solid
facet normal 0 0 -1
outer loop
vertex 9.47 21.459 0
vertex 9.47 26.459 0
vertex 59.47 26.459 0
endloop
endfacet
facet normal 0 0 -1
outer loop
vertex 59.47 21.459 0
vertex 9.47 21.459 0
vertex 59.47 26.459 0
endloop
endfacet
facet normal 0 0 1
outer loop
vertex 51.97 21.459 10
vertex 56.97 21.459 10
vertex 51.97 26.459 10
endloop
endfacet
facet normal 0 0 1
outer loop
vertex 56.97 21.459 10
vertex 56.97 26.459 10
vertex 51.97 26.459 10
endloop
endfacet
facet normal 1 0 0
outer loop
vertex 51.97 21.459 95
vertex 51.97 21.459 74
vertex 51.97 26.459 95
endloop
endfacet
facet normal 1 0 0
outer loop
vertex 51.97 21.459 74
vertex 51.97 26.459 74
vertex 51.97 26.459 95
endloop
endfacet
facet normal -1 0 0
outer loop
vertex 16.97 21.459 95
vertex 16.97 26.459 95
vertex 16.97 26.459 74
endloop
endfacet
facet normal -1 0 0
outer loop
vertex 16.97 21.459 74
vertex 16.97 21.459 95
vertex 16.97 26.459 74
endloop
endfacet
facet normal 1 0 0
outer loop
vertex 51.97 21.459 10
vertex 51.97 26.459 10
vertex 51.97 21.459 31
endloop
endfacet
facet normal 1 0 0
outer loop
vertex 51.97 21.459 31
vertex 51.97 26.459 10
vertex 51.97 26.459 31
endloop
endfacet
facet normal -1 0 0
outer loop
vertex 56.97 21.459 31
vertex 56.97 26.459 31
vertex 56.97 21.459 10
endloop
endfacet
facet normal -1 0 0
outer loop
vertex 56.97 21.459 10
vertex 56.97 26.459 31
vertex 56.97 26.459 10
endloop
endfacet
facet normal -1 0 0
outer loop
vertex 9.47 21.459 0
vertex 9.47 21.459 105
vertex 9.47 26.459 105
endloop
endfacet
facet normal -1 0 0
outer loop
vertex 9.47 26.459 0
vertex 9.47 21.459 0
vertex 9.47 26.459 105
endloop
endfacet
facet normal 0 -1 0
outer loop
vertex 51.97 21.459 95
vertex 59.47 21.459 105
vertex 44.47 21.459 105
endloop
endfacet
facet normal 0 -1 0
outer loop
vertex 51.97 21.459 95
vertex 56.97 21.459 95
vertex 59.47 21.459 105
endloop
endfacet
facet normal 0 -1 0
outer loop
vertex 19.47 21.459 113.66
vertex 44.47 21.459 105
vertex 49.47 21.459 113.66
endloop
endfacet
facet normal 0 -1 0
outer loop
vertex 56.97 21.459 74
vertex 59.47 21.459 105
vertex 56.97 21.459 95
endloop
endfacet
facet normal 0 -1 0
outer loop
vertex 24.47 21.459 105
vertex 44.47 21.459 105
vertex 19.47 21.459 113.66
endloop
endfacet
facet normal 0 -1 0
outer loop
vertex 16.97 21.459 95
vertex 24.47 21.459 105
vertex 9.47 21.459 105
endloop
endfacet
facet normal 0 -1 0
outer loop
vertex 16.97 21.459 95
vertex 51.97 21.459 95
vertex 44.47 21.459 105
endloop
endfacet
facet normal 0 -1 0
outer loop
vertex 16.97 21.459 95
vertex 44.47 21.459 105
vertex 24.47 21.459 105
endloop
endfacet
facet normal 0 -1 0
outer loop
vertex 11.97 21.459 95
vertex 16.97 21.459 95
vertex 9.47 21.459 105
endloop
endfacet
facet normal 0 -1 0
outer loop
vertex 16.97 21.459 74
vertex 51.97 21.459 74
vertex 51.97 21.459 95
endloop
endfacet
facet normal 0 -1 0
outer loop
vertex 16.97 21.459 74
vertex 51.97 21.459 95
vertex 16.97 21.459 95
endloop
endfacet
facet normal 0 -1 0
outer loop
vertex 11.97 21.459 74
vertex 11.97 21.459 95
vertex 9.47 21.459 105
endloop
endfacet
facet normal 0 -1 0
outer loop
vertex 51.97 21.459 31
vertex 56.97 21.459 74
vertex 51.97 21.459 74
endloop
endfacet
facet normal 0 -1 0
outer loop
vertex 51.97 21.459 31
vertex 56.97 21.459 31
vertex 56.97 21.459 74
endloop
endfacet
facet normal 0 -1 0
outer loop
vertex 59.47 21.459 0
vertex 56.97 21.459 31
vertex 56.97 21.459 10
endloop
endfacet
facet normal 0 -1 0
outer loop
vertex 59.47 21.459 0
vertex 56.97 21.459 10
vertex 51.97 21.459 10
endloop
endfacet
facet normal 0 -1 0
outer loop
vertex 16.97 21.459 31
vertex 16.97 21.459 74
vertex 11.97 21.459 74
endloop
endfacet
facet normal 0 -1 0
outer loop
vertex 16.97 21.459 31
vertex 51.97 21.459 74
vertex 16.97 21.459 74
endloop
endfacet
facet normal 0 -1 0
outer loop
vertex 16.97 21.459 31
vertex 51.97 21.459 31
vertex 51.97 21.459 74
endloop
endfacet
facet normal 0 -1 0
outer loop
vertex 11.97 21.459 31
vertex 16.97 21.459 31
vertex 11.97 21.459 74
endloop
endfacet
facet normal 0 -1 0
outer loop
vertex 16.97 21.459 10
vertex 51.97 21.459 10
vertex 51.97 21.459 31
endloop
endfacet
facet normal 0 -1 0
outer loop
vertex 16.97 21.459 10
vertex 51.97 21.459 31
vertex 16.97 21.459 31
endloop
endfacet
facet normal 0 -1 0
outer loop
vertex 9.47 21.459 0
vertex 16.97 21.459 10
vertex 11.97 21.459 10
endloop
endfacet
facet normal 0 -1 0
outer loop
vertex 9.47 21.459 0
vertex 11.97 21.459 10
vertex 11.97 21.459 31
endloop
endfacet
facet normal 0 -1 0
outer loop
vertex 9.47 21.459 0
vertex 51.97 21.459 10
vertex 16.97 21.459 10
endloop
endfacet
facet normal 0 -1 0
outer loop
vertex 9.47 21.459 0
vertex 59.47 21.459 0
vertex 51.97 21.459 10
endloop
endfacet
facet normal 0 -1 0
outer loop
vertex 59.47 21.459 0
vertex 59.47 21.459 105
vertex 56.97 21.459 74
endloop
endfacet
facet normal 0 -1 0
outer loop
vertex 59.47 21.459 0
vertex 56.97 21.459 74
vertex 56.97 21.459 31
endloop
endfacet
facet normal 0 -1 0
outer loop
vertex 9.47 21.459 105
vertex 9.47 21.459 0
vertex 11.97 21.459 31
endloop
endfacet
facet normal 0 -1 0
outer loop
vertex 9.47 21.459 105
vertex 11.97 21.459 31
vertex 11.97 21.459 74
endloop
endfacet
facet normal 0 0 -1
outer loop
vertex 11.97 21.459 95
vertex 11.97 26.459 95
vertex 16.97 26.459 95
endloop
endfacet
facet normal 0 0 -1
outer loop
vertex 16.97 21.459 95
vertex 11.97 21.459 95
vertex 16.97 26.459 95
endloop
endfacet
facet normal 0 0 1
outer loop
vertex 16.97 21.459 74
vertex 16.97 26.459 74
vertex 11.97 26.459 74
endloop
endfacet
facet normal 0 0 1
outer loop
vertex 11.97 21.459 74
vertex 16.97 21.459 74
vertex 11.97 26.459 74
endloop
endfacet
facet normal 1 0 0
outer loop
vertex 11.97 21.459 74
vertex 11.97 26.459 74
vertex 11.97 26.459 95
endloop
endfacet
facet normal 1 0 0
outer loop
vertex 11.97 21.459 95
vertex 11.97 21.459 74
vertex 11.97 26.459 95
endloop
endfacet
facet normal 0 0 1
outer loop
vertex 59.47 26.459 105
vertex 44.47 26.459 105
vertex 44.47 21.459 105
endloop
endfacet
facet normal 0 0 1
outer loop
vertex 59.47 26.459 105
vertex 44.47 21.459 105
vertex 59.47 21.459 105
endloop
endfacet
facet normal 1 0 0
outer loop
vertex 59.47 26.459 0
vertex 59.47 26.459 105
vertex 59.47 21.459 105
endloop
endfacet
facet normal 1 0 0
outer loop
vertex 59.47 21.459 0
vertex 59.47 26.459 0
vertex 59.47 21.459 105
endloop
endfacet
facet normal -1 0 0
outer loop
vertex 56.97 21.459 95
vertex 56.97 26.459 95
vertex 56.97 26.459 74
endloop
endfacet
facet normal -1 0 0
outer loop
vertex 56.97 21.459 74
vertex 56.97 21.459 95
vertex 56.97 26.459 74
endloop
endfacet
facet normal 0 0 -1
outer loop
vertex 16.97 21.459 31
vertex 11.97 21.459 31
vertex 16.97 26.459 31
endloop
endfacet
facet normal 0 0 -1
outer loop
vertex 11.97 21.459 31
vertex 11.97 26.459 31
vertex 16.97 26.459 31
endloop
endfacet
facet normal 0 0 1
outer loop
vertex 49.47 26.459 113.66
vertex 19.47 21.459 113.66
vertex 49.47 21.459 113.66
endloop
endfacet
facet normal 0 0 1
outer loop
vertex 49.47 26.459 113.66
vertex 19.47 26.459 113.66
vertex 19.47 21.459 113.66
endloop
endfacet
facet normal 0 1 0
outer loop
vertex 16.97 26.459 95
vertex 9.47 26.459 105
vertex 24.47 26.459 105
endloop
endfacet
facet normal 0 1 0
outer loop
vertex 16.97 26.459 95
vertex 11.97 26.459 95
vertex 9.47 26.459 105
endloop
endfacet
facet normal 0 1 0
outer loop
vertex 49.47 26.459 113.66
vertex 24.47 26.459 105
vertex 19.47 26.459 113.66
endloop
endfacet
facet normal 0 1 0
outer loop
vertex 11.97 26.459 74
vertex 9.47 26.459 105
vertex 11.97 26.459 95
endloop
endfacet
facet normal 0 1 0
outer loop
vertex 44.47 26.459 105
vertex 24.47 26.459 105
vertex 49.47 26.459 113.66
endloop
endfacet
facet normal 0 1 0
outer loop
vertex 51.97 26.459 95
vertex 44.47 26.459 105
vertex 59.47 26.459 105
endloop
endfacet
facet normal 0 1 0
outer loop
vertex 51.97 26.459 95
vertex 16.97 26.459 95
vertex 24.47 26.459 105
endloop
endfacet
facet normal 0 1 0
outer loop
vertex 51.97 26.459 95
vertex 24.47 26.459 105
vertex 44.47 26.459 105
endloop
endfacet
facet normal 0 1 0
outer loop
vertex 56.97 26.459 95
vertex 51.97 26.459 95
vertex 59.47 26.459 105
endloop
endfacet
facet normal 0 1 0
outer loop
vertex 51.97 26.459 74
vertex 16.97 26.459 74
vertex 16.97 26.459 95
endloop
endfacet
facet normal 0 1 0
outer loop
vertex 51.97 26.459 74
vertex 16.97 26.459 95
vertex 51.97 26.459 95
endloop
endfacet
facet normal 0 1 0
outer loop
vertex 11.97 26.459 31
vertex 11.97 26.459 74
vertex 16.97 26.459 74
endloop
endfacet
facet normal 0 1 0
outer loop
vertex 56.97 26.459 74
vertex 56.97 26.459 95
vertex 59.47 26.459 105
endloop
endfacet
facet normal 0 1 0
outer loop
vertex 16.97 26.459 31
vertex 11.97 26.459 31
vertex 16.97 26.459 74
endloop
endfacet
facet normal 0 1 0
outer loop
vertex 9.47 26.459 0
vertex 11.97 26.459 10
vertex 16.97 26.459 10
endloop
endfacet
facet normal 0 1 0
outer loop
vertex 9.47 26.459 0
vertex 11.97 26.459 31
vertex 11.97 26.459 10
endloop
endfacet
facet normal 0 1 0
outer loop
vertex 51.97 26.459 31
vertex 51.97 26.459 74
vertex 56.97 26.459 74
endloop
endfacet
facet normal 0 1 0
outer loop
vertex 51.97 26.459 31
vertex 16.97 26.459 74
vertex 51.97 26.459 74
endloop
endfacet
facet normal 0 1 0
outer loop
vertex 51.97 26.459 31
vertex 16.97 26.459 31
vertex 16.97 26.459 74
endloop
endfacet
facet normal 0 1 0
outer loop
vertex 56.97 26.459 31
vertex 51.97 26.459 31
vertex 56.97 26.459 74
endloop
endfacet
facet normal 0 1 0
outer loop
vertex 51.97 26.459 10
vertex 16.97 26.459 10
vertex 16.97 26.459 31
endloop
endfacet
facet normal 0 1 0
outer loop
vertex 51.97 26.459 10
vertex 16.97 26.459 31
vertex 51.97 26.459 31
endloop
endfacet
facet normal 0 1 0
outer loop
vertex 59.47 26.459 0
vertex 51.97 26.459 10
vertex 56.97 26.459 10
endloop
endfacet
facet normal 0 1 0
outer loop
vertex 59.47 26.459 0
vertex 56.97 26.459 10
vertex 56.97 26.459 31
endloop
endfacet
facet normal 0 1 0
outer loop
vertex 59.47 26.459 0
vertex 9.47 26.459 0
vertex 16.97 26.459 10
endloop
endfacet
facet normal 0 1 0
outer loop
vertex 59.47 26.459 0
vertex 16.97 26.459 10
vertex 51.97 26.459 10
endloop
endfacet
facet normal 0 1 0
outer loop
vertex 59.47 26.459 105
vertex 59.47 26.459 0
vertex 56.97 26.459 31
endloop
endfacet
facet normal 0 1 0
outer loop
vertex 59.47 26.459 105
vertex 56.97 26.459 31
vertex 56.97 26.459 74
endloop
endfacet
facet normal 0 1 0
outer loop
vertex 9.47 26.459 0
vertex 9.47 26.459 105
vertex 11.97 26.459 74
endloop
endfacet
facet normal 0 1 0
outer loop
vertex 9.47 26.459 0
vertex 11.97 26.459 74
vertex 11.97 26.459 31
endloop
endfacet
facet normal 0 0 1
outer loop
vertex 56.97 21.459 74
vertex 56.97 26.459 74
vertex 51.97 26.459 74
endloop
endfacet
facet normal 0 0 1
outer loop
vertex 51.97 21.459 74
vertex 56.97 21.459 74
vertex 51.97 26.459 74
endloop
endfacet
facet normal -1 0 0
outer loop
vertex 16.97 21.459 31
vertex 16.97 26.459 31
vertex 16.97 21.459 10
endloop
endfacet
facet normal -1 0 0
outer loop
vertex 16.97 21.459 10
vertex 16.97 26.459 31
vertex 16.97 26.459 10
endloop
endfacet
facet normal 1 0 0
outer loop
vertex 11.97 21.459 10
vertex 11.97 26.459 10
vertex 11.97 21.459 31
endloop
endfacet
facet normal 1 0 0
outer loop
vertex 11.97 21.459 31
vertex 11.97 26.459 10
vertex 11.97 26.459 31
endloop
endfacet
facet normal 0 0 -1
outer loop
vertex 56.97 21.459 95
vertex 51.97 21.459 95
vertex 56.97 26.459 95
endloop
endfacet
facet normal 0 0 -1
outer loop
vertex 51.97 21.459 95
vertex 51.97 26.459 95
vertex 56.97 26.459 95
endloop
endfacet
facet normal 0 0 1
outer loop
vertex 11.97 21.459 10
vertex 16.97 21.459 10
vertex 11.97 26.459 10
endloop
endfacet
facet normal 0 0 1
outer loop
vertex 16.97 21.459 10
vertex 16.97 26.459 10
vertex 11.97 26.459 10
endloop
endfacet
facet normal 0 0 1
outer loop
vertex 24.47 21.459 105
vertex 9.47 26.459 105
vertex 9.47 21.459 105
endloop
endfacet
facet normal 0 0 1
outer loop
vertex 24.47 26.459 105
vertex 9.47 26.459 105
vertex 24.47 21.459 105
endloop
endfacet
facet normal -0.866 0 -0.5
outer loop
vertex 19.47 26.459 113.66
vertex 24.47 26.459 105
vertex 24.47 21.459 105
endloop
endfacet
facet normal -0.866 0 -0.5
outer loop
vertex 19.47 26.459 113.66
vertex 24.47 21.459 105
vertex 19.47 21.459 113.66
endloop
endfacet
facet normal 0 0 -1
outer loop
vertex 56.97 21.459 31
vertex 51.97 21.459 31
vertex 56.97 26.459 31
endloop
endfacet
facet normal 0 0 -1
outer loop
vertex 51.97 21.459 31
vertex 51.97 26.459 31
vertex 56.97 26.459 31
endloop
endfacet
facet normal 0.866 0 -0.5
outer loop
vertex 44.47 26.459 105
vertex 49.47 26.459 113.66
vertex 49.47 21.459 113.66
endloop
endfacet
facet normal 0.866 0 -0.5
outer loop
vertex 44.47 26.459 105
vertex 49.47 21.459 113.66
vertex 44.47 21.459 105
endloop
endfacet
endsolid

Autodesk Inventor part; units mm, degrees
ref_plane "YZ Plane" through (0, 0, 0) normal (1, 0, 0) x (0, 1, 0)
ref_plane "XZ Plane" through (0, 0, 0) normal (0, 1, 0) x (-1, 0, 0)
ref_plane "XY Plane" through (0, 0, 0) normal (0, 0, 1) x (1, 0, 0)
sketch "Sketch1" plane through (0, 0, 0) normal (0, 0, 1) x (1, 0, 0)
  line L0 (9.4704, 26.4594) -> (59.4704, 26.4594)
  line L1 (59.4704, 26.4594) -> (59.4704, 21.4594)
  line L2 (59.4704, 21.4594) -> (9.4704, 21.4594)
  line L3 (9.4704, 21.4594) -> (9.4704, 26.4594)
  point P0 (0, 0)
  dimension "d0" = 50
  dimension "d1" = 5
extrude "Extrusion1" add sketch "Sketch1" along normal blind 105
sketch "Sketch2" plane through (9.4704, 26.4594, 0) normal (0, 1, 0) x (1, 0, 0)
  line L0 (0, -105) -> (50, -105) projected
  line L1 (0, 0) -> (50, 0) projected
  line L2 (0, -105) -> (50, -105)
  line L3 (50, -105) -> (50, 0)
  line L4 (50, 0) -> (0, 0)
  line L5 (0, 0) -> (0, -105)
  line L6 (2.5, -95) -> (7.5, -95)
  line L7 (7.5, -95) -> (7.5, -74)
  line L8 (7.5, -74) -> (2.5, -74)
  line L9 (2.5, -74) -> (2.5, -95)
  line L10 (42.5, -95) -> (47.5, -95)
  line L11 (47.5, -95) -> (47.5, -74)
  line L12 (47.5, -74) -> (42.5, -74)
  line L13 (42.5, -74) -> (42.5, -95)
  line L14 (42.5, -31) -> (47.5, -31)
  line L15 (47.5, -31) -> (47.5, -10)
  line L16 (47.5, -10) -> (42.5, -10)
  line L17 (42.5, -10) -> (42.5, -31)
  line L18 (2.5, -31) -> (7.5, -31)
  line L19 (7.5, -31) -> (7.5, -10)
  line L20 (7.5, -10) -> (2.5, -10)
  line L21 (2.5, -10) -> (2.5, -31)
  line L22 (15, -105) -> (10, -113.6603)
  line L23 (15, -105) -> (25, -105) construction
  line L24 (10, -113.6603) -> (40, -113.6603)
  line L25 (40, -113.6603) -> (35, -105)
  point P0 (-9.4704, 0)
  dimension "d4" = 5
  dimension "d5" = 21
  dimension "d6" = 5
  dimension "d7" = 21
  dimension "d8" = 5
  dimension "d9" = 21
  dimension "d10" = 5
  dimension "d11" = 21
  dimension "d12" = 2.5
  dimension "d13" = 2.5
  dimension "d14" = 2.5
  dimension "d15" = 2.5
  dimension "d16" = 10
  dimension "d17" = 10
  dimension "d18" = 10
  dimension "d19" = 10
  dimension "d22" = 10
  dimension "d23" = 120
  dimension "d24" = 30
  dimension "d25" = 10
  dimension "d26" = 15
  dimension "d29" = 105
  dimension "d30" = 105
  dimension "d31" = 15
  dimension "d32" = 35
extrude "Extrusion2" cut sketch "Sketch2" against normal blind 105 contours L9 L8 L7 L6 | L13 L12 L11 L10 | L17 L16 L15 L14 | L21 L20 L19 L18
extrude "Extrusion3" add sketch "Sketch2" against normal blind 5 contours L0 L25 L24 L22
equation "\"d13\" = d12"
equation "\"d14\" = d12"
equation "\"d15\" = d12"
equation "\"d17\" = d16"
equation "\"d18\" = d16"
equation "\"d19\" = d16"
properties part number "inslide1"
